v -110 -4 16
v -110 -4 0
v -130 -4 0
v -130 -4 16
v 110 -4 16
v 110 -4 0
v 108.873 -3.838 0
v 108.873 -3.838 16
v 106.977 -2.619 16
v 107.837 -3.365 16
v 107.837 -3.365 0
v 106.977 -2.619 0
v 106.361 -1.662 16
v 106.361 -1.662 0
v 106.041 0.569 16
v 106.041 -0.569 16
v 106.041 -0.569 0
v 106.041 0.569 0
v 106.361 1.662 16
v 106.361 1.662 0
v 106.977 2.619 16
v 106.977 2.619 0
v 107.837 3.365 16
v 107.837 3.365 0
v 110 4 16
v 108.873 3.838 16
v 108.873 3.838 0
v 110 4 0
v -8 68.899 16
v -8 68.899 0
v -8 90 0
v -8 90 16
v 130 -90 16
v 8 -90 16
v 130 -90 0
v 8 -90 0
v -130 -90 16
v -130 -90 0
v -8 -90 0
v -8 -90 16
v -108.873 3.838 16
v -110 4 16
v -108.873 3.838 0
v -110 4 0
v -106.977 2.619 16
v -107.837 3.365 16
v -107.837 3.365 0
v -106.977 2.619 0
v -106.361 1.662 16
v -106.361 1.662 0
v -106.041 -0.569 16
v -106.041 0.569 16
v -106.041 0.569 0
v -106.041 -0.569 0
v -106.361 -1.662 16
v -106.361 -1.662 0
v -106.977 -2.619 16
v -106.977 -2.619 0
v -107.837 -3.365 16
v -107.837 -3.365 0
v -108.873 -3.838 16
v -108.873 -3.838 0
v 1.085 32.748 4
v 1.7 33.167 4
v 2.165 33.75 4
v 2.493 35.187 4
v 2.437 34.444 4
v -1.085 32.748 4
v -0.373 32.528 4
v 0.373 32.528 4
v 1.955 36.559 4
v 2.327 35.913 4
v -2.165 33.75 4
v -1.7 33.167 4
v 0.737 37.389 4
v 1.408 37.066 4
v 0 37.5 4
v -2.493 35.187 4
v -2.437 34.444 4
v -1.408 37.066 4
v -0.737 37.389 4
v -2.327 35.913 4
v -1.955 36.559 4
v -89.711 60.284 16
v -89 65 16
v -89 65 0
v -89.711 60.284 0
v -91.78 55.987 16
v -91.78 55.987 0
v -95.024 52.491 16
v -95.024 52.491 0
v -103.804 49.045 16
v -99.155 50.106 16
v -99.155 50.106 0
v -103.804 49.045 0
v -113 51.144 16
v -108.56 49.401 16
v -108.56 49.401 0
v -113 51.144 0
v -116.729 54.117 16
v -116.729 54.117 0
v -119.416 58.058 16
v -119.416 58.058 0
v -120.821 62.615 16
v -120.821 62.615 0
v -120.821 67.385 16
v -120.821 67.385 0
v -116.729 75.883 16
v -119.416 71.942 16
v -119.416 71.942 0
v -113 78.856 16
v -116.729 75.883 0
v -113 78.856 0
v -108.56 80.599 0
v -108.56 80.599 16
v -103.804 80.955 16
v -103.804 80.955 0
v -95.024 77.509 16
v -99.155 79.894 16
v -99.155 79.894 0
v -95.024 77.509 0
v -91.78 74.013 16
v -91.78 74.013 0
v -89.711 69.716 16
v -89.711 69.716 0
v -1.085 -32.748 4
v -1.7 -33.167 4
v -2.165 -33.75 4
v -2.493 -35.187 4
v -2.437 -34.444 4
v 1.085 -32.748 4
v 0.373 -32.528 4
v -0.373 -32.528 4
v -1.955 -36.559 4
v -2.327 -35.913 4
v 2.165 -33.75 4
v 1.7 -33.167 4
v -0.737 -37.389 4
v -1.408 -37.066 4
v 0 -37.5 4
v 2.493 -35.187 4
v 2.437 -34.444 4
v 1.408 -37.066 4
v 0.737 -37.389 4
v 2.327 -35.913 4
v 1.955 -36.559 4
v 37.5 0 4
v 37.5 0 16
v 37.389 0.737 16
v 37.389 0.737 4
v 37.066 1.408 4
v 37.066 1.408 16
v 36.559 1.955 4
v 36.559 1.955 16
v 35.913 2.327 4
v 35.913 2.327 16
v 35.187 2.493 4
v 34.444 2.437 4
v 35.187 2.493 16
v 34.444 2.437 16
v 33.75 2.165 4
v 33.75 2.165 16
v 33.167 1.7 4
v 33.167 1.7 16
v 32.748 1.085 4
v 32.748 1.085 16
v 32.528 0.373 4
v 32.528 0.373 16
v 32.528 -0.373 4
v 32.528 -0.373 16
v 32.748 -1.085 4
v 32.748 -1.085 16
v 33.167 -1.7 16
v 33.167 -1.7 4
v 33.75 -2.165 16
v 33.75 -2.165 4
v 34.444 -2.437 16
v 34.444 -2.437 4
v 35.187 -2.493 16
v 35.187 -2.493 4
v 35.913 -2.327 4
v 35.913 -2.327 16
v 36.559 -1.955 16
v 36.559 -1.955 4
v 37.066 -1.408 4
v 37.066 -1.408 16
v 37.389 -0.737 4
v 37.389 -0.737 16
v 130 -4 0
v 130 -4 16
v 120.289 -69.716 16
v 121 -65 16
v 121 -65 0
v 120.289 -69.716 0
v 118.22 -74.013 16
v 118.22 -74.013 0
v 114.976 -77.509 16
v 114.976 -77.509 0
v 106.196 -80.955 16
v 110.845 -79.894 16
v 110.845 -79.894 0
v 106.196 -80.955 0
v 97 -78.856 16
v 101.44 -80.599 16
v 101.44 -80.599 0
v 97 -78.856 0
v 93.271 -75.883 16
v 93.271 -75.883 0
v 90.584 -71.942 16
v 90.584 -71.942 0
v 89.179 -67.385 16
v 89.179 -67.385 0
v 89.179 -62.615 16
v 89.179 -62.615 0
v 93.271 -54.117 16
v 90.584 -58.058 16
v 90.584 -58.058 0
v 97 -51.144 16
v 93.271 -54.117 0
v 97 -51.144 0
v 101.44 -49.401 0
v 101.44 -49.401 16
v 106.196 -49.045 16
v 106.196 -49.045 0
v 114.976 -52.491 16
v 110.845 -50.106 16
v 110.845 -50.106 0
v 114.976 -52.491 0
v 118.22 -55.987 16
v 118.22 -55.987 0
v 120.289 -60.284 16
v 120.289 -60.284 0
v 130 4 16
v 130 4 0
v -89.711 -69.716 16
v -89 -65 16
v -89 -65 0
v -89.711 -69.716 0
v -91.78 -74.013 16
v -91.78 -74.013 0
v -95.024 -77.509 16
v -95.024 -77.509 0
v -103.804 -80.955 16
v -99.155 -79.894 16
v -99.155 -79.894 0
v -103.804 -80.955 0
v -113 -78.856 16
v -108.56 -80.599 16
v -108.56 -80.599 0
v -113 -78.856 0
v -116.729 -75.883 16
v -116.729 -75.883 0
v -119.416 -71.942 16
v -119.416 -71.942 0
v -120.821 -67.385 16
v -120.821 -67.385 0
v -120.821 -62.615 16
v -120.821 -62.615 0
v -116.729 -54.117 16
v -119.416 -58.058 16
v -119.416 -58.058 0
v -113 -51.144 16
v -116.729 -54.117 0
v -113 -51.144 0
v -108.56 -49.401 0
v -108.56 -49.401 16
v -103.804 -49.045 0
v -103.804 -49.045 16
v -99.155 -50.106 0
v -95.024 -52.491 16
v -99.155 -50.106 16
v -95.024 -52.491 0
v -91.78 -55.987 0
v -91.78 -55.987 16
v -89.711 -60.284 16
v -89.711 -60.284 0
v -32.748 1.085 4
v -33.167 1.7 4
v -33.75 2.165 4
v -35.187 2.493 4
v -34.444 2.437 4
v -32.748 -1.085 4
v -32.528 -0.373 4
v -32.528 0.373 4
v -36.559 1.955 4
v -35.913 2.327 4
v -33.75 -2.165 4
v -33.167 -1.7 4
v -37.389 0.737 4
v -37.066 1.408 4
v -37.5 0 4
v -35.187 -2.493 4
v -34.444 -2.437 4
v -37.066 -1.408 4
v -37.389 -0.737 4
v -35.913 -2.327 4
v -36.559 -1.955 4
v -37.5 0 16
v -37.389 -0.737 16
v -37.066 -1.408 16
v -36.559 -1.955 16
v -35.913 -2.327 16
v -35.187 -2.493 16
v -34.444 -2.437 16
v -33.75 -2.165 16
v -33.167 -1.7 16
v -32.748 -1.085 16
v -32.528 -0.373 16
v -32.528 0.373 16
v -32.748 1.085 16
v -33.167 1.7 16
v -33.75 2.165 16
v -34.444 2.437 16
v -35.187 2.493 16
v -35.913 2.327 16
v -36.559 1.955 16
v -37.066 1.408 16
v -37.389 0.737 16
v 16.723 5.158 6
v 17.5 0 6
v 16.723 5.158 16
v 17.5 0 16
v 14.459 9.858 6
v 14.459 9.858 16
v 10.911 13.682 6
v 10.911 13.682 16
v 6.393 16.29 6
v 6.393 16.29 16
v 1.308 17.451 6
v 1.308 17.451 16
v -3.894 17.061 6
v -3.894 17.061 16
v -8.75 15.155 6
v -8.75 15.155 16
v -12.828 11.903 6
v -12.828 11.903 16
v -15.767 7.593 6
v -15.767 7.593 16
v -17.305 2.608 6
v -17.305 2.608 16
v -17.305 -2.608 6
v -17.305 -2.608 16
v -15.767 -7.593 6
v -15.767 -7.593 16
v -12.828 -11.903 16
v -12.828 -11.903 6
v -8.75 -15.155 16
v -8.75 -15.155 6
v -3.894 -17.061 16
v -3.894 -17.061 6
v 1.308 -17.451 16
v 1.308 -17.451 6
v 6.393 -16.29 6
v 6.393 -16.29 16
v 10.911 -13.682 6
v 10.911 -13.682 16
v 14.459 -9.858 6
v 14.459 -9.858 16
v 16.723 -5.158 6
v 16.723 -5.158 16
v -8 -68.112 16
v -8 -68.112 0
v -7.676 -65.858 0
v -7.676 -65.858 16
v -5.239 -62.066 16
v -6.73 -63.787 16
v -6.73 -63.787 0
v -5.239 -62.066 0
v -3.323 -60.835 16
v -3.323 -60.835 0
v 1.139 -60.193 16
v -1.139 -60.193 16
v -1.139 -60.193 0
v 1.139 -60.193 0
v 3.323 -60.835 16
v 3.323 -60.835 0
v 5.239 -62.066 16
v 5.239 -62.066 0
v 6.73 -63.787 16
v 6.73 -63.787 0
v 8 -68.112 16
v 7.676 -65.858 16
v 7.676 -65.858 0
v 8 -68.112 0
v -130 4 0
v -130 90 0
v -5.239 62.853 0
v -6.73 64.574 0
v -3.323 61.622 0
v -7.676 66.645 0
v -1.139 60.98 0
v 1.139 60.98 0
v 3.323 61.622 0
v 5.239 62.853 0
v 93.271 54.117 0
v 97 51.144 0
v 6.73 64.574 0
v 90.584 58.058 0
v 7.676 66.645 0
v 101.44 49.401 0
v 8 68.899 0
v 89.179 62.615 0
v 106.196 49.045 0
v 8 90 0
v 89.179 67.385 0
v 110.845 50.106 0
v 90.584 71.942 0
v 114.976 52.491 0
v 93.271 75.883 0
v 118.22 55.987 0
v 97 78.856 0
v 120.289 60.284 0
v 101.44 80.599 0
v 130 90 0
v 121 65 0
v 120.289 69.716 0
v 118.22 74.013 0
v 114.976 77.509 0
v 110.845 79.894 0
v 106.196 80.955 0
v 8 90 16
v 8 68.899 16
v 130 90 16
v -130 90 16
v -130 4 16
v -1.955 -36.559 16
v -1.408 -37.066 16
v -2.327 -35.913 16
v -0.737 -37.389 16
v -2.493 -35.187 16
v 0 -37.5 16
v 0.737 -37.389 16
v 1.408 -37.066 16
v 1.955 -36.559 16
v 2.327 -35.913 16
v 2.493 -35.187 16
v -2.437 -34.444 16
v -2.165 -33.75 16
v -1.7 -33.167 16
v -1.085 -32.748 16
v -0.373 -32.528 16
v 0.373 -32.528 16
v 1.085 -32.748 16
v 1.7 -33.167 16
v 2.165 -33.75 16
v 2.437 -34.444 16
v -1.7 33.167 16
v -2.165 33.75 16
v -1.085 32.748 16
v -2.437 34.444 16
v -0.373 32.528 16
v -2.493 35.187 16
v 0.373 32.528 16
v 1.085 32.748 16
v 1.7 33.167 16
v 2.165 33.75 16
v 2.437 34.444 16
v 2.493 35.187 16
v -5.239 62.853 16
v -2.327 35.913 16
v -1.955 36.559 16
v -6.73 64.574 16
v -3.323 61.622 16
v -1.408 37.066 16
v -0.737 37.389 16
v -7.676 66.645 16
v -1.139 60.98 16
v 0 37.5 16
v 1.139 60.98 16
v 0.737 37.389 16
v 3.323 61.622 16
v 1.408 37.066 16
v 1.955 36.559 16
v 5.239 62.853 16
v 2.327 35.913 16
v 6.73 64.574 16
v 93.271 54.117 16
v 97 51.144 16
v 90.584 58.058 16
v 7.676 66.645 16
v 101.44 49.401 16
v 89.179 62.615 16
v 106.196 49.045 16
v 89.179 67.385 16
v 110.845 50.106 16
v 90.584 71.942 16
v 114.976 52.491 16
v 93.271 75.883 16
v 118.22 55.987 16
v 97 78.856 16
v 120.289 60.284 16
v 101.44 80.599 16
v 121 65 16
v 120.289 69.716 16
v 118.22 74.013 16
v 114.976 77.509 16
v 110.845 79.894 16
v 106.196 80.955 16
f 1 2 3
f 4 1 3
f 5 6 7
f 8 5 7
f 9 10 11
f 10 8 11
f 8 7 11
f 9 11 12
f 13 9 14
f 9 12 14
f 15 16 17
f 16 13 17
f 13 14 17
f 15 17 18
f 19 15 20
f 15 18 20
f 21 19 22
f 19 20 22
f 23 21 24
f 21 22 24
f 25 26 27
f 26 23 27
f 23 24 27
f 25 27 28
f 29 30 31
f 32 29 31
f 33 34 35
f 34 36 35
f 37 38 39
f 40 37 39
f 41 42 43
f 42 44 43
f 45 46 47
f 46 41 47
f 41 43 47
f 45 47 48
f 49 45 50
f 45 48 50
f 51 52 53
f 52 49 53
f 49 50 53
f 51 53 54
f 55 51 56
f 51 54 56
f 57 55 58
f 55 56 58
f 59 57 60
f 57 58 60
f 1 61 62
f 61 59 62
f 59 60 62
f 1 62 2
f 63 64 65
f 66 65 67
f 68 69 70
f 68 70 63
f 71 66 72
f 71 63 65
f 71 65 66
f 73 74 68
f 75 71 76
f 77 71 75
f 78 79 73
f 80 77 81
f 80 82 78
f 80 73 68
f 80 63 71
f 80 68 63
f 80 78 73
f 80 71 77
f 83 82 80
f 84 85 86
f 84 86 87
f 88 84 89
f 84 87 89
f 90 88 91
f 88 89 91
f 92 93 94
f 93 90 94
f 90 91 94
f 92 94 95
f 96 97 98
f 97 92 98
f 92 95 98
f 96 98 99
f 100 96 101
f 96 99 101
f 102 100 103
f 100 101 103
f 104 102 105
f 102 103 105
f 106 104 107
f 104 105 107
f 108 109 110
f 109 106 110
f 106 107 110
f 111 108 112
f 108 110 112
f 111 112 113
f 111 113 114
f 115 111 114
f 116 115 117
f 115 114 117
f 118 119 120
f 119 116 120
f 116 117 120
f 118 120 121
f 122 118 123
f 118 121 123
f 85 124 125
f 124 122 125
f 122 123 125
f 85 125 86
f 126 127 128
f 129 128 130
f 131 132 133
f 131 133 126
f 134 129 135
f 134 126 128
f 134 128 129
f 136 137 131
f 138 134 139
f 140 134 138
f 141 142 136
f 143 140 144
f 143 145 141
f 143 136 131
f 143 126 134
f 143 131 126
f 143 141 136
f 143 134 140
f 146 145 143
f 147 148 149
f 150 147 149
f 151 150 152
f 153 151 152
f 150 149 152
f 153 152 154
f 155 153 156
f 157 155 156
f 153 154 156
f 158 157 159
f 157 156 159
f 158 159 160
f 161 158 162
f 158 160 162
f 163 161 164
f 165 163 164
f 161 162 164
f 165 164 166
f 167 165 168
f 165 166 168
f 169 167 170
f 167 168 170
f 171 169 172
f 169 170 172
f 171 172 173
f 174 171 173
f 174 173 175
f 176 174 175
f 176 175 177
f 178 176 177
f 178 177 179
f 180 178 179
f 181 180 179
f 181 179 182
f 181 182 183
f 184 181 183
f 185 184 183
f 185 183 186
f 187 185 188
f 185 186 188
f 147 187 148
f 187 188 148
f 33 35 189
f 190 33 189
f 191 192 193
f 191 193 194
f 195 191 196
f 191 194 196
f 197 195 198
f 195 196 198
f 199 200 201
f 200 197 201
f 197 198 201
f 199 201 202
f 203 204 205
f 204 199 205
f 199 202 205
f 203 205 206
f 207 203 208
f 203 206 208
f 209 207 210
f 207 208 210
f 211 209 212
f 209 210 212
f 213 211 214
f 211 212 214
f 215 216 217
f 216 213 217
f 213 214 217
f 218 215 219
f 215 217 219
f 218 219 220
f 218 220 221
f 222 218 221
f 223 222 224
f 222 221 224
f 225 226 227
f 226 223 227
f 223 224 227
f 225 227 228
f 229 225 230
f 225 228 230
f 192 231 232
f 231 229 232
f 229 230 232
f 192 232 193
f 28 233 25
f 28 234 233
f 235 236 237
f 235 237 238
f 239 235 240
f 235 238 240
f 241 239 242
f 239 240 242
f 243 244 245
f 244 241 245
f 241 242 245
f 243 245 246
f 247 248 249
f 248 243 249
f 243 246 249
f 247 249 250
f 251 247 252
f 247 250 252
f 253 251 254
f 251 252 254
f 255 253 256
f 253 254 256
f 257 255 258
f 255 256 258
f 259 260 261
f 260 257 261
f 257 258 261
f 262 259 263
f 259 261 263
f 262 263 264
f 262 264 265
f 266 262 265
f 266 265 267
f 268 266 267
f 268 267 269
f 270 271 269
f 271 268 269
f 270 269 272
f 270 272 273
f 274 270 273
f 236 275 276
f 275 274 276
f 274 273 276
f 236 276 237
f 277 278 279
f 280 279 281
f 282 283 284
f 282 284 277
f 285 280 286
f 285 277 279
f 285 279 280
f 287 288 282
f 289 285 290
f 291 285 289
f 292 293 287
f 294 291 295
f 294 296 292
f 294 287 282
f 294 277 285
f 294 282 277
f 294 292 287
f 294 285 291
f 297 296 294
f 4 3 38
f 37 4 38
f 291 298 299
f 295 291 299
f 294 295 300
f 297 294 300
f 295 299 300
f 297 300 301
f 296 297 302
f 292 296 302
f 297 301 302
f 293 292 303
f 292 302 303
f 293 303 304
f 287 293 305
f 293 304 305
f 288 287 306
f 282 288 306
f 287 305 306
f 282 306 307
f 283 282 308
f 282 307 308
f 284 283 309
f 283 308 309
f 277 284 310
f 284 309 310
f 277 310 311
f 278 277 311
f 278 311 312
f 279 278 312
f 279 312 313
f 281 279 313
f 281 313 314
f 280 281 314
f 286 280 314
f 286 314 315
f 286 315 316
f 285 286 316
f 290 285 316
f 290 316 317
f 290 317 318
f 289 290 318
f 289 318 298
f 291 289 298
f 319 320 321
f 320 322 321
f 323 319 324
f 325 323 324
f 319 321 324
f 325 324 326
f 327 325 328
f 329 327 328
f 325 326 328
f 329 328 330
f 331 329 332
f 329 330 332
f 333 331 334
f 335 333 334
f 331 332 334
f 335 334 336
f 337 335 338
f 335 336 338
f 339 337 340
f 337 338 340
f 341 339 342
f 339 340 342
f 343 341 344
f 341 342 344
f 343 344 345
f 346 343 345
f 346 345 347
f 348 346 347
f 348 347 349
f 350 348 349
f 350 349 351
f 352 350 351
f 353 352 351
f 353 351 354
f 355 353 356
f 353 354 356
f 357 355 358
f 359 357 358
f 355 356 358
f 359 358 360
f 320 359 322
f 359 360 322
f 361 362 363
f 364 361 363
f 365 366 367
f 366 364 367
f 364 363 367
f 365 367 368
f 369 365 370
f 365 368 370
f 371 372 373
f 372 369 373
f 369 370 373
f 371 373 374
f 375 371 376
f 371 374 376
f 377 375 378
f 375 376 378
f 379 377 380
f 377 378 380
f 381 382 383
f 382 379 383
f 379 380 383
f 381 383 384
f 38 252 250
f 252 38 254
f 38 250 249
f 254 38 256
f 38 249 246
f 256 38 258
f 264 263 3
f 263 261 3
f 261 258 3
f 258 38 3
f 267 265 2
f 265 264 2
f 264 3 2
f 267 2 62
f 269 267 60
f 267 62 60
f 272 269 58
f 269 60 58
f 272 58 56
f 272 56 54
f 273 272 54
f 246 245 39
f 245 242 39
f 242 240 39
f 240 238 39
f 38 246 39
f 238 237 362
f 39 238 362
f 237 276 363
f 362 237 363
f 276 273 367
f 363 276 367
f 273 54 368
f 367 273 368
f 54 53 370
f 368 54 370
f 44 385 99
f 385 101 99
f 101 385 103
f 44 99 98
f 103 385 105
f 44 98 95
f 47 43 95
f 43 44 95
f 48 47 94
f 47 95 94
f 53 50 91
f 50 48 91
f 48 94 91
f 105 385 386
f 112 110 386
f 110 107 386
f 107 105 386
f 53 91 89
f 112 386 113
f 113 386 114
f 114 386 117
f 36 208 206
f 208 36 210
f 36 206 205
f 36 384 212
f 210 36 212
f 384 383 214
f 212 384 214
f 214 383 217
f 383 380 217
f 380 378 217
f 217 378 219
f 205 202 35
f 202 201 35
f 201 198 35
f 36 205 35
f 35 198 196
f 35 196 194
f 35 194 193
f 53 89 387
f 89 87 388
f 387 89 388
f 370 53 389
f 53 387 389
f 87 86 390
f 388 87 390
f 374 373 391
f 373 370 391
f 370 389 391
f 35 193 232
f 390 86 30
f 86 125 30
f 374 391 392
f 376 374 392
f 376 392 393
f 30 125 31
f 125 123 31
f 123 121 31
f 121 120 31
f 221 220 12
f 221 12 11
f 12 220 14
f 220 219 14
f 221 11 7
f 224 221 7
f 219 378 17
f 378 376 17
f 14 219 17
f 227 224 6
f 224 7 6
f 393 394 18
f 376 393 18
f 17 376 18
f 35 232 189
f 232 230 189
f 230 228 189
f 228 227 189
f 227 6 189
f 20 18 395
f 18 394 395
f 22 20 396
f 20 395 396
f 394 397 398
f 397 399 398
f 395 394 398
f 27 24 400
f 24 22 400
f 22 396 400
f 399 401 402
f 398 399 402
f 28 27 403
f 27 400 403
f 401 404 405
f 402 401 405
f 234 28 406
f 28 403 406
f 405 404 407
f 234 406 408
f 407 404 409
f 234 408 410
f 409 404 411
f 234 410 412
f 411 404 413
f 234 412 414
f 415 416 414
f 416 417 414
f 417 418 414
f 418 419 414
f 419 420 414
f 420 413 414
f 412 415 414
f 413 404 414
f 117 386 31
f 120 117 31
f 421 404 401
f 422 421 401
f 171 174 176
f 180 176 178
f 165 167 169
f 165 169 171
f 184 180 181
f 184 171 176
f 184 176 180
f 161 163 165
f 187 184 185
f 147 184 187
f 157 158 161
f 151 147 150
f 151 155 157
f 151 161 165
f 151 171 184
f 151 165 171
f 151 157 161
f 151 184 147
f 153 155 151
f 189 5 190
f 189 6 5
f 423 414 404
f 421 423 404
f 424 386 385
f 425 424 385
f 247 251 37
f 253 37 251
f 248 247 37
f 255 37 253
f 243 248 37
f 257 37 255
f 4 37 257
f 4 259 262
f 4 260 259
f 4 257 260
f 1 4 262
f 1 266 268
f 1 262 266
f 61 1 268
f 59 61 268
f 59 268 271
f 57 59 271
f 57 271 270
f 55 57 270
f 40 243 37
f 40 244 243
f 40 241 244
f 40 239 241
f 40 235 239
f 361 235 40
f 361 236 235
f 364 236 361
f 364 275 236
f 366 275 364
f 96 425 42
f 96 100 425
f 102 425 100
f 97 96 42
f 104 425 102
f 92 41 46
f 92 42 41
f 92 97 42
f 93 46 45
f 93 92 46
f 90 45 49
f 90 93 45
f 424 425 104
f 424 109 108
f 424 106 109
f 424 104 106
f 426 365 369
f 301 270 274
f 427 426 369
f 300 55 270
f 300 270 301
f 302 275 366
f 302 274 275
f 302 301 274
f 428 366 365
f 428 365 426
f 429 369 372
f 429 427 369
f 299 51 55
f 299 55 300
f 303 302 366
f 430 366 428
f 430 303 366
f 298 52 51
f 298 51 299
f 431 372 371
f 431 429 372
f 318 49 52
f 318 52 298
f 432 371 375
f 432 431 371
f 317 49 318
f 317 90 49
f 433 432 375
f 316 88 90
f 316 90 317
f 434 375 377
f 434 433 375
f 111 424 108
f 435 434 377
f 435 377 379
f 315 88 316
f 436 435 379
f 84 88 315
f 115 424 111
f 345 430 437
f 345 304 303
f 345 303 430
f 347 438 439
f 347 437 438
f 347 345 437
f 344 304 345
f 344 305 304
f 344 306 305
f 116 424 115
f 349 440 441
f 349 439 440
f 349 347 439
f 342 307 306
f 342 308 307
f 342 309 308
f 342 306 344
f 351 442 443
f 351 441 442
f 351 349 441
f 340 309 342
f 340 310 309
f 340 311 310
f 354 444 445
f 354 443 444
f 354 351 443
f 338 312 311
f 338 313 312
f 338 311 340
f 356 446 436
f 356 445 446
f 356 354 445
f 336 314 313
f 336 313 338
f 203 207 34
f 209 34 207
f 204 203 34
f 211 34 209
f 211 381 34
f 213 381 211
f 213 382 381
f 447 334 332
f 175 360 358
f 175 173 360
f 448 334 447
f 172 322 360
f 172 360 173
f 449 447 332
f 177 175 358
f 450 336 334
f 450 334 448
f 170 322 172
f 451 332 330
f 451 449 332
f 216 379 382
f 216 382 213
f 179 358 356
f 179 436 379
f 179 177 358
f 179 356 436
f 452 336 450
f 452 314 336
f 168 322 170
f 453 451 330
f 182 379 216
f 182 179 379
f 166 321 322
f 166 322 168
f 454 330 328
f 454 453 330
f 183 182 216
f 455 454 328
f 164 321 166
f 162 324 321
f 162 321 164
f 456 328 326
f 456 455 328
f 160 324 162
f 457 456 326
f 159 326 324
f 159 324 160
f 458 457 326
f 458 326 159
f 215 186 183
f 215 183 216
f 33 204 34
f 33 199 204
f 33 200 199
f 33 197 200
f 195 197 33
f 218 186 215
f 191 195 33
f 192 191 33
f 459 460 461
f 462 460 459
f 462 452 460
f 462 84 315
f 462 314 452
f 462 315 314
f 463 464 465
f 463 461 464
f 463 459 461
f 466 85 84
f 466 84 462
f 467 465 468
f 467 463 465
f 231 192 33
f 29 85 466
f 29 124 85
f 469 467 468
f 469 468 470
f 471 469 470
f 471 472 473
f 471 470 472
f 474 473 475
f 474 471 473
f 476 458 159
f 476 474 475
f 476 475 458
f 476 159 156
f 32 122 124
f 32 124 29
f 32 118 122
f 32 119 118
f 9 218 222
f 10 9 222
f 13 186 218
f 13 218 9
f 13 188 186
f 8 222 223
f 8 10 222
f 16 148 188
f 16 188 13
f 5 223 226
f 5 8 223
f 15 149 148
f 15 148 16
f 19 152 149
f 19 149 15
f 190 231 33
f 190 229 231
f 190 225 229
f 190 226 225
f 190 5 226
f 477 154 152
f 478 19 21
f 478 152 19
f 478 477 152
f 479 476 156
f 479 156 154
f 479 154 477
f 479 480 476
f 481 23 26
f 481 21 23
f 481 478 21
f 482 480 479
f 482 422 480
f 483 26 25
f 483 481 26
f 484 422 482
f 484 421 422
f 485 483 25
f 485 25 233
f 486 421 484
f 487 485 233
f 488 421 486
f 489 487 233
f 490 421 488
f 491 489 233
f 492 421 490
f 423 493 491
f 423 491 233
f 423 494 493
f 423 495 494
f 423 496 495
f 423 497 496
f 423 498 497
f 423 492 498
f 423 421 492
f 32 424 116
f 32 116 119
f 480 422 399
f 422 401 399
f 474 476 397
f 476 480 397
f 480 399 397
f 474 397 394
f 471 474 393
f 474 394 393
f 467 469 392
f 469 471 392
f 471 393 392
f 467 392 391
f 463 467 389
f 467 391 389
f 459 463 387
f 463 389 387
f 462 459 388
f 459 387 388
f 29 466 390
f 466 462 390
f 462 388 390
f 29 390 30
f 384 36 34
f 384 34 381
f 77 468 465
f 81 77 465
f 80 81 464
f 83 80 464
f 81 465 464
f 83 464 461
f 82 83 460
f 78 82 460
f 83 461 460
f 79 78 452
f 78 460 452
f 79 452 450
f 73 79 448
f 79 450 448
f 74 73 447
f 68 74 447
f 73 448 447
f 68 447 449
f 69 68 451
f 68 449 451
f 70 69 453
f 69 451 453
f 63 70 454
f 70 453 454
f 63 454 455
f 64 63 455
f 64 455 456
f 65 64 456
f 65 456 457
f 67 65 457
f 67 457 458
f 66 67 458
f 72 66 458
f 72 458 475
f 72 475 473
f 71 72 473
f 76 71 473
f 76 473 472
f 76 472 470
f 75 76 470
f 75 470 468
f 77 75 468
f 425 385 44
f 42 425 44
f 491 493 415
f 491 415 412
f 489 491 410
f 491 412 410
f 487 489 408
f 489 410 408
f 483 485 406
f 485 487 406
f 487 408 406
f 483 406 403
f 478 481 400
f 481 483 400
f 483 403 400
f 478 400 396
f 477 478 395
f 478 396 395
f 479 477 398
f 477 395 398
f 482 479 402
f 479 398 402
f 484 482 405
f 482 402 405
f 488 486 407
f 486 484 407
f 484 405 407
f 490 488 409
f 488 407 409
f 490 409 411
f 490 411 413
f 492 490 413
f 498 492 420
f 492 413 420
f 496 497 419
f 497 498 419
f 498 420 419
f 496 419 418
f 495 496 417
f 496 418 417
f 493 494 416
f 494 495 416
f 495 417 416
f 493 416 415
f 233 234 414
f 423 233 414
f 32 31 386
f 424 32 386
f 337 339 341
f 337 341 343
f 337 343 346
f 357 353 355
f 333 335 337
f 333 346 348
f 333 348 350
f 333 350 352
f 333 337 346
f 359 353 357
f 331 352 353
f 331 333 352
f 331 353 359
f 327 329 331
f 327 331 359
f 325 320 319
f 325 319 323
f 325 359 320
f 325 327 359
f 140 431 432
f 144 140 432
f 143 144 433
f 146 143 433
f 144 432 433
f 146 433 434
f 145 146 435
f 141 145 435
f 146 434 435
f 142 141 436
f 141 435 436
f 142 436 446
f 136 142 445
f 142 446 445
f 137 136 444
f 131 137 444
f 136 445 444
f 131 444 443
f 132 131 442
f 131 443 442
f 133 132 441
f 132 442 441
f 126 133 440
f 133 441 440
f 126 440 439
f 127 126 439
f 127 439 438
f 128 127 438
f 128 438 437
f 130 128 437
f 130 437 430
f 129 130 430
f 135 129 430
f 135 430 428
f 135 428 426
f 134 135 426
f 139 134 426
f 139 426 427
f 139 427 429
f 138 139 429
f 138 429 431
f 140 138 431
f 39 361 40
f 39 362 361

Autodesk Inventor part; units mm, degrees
ref_plane "YZ Plane" through (0, 0, 0) normal (1, 0, 0) x (0, 1, 0)
ref_plane "XZ Plane" through (0, 0, 0) normal (0, 1, 0) x (-1, 0, 0)
ref_plane "XY Plane" through (0, 0, 0) normal (0, 0, 1) x (1, 0, 0)
sketch "Sketch1" plane through (0, 0, 0) normal (0, 0, 1) x (1, 0, 0)
  line L0 (130, 90) -> (-130, -90) construction
  line L1 (-130, 90) -> (130, -90) construction
  circle A0 centre (-105, 65) radius 16
  circle A1 centre (105, 65) radius 16
  circle A2 centre (105, -65) radius 16
  circle A3 centre (-105, -65) radius 16
  line L2 (0, -68.1117) -> (0, -128.2653) construction
  line L3 (-8, -68.1117) -> (-8, -90)
  line L4 (8, -90) -> (8, -68.1117)
  arc A4 (8, -68.1117) -> (-8, -68.1117) centre (0, -68.1117) ccw
  line L5 (138.2624, 0) -> (110, 0) construction
  line L6 (130, 4) -> (110, 4)
  line L7 (110, -4) -> (130, -4)
  arc A5 (110, 4) -> (110, -4) centre (110, 0) ccw
  line L8 (-67.4567, 0.3936) -> (51.9271, 0.3936) construction
  line L9 (0, -23.6129) -> (0, 33.7533) construction
  line L10 (-8, 68.899) -> (-8, 90)
  line L11 (8, 90) -> (8, 68.899)
  arc A6 (-8, 68.899) -> (8, 68.899) centre (0, 68.899) ccw
  line L12 (-130, -90) -> (-8, -90)
  line L13 (8, -90) -> (130, -90)
  line L14 (130, -90) -> (130, -4)
  line L15 (130, 4) -> (130, 90)
  line L16 (130, 90) -> (8, 90)
  line L17 (-8, 90) -> (-130, 90)
  line L18 (-130, 4) -> (-110, 4)
  line L19 (-110, -4) -> (-130, -4)
  arc A7 (-110, -4) -> (-110, 4) centre (-110, 0) ccw
  line L20 (-130, 90) -> (-130, 4)
  line L21 (-130, -4) -> (-130, -90)
  point P0 (0, 0)
  point P1 (4, -128.8323)
  point P2 (0, -98.1885)
  point P3 (124.1312, 0)
  point P4 (4, -87.7077)
  point P5 (130, 0)
  point P6 (-4, 128.8323)
  point P7 (4, 129.6196)
  dimension "d2" = 32
  dimension "d3" = 105
  dimension "d5" = 65
  dimension "d6" = 105
  dimension "d7" = 65
  dimension "d9" = 8
  dimension "d10" = 20
  dimension "d11" = 20
  dimension "d24" = 8
  dimension "d25" = 101
  dimension "d26" = 97
  dimension "d27" = 97
  dimension "d28" = 65
  dimension "d29" = 65
  dimension "d30" = 0
  dimension "d31" = 4
  dimension "d32" = 4
  dimension "d33" = 260
  dimension "d34" = 260
  dimension "d35" = 180
  dimension "d36" = 180
extrude "Extrusion1" add sketch "Sketch1" along normal blind 16
sketch "Sketch2" plane through (0, 0, 16) normal (0, 0, 1) x (1, 0, 0)
  circle A0 centre (35, 0) radius 2.5
  point P0 (0, 0)
  dimension "d14" = 5
  dimension "d15" = 35
extrude "Extrusion2" cut sketch "Sketch2" against normal blind 12
sketch "Sketch3" plane through (0, 0, 16) normal (0, 0, 1) x (1, 0, 0)
  circle A0 centre (0, 0) radius 17.5
  dimension "d18" = 35
extrude "Extrusion3" cut sketch "Sketch3" against normal blind 10
pattern_circular "Circular Pattern1" count 4 over 360 about axis through (0, 0, 16) along (0, 0, -1) of "Extrusion2"
properties part number "Base superior da ferramenta"
